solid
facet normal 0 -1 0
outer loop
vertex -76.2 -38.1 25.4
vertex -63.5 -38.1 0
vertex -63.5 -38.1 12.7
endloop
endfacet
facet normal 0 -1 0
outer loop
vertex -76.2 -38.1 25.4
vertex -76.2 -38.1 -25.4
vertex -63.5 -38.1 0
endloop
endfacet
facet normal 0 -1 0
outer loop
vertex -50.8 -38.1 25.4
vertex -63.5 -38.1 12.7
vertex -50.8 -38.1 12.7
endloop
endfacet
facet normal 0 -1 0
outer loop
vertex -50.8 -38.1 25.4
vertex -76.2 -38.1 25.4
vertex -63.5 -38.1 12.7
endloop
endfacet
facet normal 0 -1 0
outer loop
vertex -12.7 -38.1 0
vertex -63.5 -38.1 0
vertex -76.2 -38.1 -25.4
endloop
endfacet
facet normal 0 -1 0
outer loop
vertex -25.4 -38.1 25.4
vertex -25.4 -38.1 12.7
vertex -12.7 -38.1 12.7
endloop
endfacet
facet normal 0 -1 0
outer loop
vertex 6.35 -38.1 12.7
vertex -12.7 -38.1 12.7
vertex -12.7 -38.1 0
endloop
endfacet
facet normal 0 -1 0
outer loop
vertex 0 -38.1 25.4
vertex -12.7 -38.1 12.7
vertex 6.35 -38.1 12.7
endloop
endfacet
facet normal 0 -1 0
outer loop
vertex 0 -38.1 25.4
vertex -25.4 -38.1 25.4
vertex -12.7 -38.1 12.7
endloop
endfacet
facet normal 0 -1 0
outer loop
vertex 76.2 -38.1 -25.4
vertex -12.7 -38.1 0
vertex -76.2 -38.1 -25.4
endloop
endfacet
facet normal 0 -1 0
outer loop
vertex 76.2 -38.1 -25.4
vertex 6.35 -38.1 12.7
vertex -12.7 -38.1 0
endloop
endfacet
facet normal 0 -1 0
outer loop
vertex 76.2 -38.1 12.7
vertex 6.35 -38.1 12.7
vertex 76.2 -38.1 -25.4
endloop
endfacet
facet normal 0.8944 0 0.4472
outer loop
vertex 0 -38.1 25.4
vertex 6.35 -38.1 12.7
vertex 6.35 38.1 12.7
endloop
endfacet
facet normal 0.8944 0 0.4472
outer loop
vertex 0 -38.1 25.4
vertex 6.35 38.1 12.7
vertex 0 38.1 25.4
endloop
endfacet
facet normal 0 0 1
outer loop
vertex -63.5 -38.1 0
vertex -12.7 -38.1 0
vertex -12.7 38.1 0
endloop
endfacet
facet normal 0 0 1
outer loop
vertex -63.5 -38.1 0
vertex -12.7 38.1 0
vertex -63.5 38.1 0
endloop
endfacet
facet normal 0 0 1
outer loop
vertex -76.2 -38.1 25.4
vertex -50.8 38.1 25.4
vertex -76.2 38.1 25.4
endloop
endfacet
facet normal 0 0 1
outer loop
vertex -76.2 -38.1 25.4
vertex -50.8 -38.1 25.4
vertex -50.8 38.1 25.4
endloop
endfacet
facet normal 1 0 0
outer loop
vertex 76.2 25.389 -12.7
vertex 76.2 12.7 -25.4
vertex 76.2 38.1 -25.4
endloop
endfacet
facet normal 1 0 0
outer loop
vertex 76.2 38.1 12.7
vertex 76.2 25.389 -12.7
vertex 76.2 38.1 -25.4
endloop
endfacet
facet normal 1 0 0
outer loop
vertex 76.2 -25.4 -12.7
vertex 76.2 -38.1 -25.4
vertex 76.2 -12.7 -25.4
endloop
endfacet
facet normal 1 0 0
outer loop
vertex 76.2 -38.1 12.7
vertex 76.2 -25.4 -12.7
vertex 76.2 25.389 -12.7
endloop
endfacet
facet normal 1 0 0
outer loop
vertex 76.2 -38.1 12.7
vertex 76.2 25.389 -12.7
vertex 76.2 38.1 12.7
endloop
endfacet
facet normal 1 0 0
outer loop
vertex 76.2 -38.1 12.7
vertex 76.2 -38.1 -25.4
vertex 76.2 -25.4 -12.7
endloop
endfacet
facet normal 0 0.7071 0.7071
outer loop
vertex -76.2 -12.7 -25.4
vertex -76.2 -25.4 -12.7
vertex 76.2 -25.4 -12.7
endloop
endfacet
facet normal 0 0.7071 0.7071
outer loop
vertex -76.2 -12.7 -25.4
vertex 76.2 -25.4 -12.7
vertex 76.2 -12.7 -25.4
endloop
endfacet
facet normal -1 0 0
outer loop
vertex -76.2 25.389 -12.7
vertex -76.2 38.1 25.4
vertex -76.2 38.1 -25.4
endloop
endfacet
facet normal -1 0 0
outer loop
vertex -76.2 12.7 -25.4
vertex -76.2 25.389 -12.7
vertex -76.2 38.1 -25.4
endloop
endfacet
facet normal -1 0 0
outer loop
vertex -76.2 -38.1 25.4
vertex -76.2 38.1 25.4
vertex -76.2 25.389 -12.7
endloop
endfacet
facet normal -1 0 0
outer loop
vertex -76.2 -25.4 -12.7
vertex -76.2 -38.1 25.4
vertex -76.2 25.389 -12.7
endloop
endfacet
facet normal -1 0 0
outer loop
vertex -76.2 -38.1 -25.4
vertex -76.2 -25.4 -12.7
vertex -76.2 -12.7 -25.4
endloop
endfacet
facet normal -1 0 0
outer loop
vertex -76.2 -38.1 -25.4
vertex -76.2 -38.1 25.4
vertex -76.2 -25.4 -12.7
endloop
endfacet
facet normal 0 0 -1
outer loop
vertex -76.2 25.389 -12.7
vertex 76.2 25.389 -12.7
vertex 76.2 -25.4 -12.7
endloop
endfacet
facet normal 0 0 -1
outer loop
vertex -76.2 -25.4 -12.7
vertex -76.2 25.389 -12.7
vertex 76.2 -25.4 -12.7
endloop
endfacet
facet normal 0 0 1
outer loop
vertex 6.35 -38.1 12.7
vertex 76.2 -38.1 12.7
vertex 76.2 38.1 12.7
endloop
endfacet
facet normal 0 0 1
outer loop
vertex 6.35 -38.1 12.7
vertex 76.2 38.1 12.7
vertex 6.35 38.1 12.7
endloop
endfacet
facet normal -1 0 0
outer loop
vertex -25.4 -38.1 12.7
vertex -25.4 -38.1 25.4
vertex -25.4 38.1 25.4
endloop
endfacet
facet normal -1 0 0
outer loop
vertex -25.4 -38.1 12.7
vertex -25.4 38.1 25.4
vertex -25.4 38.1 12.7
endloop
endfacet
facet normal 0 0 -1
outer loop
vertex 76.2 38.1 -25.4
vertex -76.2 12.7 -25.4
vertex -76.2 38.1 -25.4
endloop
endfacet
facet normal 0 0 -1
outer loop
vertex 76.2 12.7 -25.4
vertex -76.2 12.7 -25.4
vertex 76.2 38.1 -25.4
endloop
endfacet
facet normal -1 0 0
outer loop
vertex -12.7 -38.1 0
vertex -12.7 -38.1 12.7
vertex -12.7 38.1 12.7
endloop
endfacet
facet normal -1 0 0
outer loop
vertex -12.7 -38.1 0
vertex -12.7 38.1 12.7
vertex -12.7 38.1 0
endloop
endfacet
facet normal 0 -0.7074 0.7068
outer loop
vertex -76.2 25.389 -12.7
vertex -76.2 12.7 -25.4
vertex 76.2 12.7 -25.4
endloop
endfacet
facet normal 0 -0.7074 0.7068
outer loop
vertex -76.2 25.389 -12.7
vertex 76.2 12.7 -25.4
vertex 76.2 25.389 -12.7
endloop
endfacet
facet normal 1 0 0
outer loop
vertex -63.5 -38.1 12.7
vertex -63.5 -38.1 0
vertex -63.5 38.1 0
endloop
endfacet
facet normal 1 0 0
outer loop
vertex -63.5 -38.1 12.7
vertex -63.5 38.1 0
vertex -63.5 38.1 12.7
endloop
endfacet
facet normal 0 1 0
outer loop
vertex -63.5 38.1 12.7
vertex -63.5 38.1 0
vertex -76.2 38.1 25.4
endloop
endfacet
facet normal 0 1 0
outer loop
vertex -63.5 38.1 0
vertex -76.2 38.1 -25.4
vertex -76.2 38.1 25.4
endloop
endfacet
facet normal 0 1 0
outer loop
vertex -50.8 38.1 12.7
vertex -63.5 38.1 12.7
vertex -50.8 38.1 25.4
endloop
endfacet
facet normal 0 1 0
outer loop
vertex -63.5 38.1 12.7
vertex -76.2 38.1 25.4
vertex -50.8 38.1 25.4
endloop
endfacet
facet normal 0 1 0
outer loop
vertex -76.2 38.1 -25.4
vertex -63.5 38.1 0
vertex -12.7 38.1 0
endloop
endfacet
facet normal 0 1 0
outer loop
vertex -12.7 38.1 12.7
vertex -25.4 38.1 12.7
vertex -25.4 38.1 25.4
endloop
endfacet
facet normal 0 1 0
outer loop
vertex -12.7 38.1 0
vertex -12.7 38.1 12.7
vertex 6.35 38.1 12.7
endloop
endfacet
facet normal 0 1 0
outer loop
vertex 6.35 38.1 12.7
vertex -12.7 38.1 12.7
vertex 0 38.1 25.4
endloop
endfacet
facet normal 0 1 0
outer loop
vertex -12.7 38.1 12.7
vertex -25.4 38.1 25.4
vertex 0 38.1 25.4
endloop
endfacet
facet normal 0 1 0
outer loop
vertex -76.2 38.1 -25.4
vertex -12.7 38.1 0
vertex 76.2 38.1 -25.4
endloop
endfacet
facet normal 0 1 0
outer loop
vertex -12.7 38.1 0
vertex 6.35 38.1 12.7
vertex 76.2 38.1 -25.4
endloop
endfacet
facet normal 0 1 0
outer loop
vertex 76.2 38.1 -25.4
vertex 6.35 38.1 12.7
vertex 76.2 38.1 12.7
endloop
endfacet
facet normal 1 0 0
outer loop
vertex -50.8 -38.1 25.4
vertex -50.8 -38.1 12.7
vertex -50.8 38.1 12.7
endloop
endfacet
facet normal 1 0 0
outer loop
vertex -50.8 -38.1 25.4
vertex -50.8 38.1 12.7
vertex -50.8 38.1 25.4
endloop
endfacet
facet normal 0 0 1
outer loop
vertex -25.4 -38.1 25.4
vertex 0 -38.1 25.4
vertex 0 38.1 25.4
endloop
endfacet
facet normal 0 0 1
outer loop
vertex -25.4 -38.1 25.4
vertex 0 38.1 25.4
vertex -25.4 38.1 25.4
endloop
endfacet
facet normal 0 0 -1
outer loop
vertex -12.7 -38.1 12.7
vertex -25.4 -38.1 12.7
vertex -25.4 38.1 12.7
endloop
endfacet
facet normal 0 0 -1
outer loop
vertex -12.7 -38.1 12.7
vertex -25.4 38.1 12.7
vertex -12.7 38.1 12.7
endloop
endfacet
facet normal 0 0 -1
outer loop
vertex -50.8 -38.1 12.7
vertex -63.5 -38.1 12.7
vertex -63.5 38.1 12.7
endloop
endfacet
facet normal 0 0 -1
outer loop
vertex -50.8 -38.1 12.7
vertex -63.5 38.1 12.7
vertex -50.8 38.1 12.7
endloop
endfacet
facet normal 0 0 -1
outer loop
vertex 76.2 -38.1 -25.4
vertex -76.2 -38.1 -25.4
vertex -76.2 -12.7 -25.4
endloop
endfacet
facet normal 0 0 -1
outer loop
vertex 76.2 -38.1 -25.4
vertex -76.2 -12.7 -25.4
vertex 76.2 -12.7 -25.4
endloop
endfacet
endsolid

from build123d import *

# Parameters (mm, degrees)
F1_DEPTH = 38.1
F3_DEPTH = 152.401


with BuildPart() as f1:
    # F0 (on Front) → F1 (new body, symmetric)
    with BuildSketch(Plane.XZ):
        Polygon((-76.2, -25.4), (76.2, -25.4), (76.2, 12.7), (6.35, 12.7), (0, 25.4), (-25.4, 25.4), (-25.4, 12.7), (-12.7, 12.7), (-12.7, 0), (-63.5, 0), (-63.5, 12.7), (-50.8, 12.7), (-50.8, 25.4), (-76.2, 25.4), align=None)
    extrude(amount=F1_DEPTH, both=True)

    # F2 (on face) → F3 (cut, through all)
    with BuildSketch(Plane.YZ.offset(76.2)):
        Polygon((25.389396, -12.7), (-25.4, -12.7), (-12.7, -25.4), (12.7, -25.4), align=None)
    extrude(amount=-F3_DEPTH, mode=Mode.SUBTRACT)


solid = f1.part
